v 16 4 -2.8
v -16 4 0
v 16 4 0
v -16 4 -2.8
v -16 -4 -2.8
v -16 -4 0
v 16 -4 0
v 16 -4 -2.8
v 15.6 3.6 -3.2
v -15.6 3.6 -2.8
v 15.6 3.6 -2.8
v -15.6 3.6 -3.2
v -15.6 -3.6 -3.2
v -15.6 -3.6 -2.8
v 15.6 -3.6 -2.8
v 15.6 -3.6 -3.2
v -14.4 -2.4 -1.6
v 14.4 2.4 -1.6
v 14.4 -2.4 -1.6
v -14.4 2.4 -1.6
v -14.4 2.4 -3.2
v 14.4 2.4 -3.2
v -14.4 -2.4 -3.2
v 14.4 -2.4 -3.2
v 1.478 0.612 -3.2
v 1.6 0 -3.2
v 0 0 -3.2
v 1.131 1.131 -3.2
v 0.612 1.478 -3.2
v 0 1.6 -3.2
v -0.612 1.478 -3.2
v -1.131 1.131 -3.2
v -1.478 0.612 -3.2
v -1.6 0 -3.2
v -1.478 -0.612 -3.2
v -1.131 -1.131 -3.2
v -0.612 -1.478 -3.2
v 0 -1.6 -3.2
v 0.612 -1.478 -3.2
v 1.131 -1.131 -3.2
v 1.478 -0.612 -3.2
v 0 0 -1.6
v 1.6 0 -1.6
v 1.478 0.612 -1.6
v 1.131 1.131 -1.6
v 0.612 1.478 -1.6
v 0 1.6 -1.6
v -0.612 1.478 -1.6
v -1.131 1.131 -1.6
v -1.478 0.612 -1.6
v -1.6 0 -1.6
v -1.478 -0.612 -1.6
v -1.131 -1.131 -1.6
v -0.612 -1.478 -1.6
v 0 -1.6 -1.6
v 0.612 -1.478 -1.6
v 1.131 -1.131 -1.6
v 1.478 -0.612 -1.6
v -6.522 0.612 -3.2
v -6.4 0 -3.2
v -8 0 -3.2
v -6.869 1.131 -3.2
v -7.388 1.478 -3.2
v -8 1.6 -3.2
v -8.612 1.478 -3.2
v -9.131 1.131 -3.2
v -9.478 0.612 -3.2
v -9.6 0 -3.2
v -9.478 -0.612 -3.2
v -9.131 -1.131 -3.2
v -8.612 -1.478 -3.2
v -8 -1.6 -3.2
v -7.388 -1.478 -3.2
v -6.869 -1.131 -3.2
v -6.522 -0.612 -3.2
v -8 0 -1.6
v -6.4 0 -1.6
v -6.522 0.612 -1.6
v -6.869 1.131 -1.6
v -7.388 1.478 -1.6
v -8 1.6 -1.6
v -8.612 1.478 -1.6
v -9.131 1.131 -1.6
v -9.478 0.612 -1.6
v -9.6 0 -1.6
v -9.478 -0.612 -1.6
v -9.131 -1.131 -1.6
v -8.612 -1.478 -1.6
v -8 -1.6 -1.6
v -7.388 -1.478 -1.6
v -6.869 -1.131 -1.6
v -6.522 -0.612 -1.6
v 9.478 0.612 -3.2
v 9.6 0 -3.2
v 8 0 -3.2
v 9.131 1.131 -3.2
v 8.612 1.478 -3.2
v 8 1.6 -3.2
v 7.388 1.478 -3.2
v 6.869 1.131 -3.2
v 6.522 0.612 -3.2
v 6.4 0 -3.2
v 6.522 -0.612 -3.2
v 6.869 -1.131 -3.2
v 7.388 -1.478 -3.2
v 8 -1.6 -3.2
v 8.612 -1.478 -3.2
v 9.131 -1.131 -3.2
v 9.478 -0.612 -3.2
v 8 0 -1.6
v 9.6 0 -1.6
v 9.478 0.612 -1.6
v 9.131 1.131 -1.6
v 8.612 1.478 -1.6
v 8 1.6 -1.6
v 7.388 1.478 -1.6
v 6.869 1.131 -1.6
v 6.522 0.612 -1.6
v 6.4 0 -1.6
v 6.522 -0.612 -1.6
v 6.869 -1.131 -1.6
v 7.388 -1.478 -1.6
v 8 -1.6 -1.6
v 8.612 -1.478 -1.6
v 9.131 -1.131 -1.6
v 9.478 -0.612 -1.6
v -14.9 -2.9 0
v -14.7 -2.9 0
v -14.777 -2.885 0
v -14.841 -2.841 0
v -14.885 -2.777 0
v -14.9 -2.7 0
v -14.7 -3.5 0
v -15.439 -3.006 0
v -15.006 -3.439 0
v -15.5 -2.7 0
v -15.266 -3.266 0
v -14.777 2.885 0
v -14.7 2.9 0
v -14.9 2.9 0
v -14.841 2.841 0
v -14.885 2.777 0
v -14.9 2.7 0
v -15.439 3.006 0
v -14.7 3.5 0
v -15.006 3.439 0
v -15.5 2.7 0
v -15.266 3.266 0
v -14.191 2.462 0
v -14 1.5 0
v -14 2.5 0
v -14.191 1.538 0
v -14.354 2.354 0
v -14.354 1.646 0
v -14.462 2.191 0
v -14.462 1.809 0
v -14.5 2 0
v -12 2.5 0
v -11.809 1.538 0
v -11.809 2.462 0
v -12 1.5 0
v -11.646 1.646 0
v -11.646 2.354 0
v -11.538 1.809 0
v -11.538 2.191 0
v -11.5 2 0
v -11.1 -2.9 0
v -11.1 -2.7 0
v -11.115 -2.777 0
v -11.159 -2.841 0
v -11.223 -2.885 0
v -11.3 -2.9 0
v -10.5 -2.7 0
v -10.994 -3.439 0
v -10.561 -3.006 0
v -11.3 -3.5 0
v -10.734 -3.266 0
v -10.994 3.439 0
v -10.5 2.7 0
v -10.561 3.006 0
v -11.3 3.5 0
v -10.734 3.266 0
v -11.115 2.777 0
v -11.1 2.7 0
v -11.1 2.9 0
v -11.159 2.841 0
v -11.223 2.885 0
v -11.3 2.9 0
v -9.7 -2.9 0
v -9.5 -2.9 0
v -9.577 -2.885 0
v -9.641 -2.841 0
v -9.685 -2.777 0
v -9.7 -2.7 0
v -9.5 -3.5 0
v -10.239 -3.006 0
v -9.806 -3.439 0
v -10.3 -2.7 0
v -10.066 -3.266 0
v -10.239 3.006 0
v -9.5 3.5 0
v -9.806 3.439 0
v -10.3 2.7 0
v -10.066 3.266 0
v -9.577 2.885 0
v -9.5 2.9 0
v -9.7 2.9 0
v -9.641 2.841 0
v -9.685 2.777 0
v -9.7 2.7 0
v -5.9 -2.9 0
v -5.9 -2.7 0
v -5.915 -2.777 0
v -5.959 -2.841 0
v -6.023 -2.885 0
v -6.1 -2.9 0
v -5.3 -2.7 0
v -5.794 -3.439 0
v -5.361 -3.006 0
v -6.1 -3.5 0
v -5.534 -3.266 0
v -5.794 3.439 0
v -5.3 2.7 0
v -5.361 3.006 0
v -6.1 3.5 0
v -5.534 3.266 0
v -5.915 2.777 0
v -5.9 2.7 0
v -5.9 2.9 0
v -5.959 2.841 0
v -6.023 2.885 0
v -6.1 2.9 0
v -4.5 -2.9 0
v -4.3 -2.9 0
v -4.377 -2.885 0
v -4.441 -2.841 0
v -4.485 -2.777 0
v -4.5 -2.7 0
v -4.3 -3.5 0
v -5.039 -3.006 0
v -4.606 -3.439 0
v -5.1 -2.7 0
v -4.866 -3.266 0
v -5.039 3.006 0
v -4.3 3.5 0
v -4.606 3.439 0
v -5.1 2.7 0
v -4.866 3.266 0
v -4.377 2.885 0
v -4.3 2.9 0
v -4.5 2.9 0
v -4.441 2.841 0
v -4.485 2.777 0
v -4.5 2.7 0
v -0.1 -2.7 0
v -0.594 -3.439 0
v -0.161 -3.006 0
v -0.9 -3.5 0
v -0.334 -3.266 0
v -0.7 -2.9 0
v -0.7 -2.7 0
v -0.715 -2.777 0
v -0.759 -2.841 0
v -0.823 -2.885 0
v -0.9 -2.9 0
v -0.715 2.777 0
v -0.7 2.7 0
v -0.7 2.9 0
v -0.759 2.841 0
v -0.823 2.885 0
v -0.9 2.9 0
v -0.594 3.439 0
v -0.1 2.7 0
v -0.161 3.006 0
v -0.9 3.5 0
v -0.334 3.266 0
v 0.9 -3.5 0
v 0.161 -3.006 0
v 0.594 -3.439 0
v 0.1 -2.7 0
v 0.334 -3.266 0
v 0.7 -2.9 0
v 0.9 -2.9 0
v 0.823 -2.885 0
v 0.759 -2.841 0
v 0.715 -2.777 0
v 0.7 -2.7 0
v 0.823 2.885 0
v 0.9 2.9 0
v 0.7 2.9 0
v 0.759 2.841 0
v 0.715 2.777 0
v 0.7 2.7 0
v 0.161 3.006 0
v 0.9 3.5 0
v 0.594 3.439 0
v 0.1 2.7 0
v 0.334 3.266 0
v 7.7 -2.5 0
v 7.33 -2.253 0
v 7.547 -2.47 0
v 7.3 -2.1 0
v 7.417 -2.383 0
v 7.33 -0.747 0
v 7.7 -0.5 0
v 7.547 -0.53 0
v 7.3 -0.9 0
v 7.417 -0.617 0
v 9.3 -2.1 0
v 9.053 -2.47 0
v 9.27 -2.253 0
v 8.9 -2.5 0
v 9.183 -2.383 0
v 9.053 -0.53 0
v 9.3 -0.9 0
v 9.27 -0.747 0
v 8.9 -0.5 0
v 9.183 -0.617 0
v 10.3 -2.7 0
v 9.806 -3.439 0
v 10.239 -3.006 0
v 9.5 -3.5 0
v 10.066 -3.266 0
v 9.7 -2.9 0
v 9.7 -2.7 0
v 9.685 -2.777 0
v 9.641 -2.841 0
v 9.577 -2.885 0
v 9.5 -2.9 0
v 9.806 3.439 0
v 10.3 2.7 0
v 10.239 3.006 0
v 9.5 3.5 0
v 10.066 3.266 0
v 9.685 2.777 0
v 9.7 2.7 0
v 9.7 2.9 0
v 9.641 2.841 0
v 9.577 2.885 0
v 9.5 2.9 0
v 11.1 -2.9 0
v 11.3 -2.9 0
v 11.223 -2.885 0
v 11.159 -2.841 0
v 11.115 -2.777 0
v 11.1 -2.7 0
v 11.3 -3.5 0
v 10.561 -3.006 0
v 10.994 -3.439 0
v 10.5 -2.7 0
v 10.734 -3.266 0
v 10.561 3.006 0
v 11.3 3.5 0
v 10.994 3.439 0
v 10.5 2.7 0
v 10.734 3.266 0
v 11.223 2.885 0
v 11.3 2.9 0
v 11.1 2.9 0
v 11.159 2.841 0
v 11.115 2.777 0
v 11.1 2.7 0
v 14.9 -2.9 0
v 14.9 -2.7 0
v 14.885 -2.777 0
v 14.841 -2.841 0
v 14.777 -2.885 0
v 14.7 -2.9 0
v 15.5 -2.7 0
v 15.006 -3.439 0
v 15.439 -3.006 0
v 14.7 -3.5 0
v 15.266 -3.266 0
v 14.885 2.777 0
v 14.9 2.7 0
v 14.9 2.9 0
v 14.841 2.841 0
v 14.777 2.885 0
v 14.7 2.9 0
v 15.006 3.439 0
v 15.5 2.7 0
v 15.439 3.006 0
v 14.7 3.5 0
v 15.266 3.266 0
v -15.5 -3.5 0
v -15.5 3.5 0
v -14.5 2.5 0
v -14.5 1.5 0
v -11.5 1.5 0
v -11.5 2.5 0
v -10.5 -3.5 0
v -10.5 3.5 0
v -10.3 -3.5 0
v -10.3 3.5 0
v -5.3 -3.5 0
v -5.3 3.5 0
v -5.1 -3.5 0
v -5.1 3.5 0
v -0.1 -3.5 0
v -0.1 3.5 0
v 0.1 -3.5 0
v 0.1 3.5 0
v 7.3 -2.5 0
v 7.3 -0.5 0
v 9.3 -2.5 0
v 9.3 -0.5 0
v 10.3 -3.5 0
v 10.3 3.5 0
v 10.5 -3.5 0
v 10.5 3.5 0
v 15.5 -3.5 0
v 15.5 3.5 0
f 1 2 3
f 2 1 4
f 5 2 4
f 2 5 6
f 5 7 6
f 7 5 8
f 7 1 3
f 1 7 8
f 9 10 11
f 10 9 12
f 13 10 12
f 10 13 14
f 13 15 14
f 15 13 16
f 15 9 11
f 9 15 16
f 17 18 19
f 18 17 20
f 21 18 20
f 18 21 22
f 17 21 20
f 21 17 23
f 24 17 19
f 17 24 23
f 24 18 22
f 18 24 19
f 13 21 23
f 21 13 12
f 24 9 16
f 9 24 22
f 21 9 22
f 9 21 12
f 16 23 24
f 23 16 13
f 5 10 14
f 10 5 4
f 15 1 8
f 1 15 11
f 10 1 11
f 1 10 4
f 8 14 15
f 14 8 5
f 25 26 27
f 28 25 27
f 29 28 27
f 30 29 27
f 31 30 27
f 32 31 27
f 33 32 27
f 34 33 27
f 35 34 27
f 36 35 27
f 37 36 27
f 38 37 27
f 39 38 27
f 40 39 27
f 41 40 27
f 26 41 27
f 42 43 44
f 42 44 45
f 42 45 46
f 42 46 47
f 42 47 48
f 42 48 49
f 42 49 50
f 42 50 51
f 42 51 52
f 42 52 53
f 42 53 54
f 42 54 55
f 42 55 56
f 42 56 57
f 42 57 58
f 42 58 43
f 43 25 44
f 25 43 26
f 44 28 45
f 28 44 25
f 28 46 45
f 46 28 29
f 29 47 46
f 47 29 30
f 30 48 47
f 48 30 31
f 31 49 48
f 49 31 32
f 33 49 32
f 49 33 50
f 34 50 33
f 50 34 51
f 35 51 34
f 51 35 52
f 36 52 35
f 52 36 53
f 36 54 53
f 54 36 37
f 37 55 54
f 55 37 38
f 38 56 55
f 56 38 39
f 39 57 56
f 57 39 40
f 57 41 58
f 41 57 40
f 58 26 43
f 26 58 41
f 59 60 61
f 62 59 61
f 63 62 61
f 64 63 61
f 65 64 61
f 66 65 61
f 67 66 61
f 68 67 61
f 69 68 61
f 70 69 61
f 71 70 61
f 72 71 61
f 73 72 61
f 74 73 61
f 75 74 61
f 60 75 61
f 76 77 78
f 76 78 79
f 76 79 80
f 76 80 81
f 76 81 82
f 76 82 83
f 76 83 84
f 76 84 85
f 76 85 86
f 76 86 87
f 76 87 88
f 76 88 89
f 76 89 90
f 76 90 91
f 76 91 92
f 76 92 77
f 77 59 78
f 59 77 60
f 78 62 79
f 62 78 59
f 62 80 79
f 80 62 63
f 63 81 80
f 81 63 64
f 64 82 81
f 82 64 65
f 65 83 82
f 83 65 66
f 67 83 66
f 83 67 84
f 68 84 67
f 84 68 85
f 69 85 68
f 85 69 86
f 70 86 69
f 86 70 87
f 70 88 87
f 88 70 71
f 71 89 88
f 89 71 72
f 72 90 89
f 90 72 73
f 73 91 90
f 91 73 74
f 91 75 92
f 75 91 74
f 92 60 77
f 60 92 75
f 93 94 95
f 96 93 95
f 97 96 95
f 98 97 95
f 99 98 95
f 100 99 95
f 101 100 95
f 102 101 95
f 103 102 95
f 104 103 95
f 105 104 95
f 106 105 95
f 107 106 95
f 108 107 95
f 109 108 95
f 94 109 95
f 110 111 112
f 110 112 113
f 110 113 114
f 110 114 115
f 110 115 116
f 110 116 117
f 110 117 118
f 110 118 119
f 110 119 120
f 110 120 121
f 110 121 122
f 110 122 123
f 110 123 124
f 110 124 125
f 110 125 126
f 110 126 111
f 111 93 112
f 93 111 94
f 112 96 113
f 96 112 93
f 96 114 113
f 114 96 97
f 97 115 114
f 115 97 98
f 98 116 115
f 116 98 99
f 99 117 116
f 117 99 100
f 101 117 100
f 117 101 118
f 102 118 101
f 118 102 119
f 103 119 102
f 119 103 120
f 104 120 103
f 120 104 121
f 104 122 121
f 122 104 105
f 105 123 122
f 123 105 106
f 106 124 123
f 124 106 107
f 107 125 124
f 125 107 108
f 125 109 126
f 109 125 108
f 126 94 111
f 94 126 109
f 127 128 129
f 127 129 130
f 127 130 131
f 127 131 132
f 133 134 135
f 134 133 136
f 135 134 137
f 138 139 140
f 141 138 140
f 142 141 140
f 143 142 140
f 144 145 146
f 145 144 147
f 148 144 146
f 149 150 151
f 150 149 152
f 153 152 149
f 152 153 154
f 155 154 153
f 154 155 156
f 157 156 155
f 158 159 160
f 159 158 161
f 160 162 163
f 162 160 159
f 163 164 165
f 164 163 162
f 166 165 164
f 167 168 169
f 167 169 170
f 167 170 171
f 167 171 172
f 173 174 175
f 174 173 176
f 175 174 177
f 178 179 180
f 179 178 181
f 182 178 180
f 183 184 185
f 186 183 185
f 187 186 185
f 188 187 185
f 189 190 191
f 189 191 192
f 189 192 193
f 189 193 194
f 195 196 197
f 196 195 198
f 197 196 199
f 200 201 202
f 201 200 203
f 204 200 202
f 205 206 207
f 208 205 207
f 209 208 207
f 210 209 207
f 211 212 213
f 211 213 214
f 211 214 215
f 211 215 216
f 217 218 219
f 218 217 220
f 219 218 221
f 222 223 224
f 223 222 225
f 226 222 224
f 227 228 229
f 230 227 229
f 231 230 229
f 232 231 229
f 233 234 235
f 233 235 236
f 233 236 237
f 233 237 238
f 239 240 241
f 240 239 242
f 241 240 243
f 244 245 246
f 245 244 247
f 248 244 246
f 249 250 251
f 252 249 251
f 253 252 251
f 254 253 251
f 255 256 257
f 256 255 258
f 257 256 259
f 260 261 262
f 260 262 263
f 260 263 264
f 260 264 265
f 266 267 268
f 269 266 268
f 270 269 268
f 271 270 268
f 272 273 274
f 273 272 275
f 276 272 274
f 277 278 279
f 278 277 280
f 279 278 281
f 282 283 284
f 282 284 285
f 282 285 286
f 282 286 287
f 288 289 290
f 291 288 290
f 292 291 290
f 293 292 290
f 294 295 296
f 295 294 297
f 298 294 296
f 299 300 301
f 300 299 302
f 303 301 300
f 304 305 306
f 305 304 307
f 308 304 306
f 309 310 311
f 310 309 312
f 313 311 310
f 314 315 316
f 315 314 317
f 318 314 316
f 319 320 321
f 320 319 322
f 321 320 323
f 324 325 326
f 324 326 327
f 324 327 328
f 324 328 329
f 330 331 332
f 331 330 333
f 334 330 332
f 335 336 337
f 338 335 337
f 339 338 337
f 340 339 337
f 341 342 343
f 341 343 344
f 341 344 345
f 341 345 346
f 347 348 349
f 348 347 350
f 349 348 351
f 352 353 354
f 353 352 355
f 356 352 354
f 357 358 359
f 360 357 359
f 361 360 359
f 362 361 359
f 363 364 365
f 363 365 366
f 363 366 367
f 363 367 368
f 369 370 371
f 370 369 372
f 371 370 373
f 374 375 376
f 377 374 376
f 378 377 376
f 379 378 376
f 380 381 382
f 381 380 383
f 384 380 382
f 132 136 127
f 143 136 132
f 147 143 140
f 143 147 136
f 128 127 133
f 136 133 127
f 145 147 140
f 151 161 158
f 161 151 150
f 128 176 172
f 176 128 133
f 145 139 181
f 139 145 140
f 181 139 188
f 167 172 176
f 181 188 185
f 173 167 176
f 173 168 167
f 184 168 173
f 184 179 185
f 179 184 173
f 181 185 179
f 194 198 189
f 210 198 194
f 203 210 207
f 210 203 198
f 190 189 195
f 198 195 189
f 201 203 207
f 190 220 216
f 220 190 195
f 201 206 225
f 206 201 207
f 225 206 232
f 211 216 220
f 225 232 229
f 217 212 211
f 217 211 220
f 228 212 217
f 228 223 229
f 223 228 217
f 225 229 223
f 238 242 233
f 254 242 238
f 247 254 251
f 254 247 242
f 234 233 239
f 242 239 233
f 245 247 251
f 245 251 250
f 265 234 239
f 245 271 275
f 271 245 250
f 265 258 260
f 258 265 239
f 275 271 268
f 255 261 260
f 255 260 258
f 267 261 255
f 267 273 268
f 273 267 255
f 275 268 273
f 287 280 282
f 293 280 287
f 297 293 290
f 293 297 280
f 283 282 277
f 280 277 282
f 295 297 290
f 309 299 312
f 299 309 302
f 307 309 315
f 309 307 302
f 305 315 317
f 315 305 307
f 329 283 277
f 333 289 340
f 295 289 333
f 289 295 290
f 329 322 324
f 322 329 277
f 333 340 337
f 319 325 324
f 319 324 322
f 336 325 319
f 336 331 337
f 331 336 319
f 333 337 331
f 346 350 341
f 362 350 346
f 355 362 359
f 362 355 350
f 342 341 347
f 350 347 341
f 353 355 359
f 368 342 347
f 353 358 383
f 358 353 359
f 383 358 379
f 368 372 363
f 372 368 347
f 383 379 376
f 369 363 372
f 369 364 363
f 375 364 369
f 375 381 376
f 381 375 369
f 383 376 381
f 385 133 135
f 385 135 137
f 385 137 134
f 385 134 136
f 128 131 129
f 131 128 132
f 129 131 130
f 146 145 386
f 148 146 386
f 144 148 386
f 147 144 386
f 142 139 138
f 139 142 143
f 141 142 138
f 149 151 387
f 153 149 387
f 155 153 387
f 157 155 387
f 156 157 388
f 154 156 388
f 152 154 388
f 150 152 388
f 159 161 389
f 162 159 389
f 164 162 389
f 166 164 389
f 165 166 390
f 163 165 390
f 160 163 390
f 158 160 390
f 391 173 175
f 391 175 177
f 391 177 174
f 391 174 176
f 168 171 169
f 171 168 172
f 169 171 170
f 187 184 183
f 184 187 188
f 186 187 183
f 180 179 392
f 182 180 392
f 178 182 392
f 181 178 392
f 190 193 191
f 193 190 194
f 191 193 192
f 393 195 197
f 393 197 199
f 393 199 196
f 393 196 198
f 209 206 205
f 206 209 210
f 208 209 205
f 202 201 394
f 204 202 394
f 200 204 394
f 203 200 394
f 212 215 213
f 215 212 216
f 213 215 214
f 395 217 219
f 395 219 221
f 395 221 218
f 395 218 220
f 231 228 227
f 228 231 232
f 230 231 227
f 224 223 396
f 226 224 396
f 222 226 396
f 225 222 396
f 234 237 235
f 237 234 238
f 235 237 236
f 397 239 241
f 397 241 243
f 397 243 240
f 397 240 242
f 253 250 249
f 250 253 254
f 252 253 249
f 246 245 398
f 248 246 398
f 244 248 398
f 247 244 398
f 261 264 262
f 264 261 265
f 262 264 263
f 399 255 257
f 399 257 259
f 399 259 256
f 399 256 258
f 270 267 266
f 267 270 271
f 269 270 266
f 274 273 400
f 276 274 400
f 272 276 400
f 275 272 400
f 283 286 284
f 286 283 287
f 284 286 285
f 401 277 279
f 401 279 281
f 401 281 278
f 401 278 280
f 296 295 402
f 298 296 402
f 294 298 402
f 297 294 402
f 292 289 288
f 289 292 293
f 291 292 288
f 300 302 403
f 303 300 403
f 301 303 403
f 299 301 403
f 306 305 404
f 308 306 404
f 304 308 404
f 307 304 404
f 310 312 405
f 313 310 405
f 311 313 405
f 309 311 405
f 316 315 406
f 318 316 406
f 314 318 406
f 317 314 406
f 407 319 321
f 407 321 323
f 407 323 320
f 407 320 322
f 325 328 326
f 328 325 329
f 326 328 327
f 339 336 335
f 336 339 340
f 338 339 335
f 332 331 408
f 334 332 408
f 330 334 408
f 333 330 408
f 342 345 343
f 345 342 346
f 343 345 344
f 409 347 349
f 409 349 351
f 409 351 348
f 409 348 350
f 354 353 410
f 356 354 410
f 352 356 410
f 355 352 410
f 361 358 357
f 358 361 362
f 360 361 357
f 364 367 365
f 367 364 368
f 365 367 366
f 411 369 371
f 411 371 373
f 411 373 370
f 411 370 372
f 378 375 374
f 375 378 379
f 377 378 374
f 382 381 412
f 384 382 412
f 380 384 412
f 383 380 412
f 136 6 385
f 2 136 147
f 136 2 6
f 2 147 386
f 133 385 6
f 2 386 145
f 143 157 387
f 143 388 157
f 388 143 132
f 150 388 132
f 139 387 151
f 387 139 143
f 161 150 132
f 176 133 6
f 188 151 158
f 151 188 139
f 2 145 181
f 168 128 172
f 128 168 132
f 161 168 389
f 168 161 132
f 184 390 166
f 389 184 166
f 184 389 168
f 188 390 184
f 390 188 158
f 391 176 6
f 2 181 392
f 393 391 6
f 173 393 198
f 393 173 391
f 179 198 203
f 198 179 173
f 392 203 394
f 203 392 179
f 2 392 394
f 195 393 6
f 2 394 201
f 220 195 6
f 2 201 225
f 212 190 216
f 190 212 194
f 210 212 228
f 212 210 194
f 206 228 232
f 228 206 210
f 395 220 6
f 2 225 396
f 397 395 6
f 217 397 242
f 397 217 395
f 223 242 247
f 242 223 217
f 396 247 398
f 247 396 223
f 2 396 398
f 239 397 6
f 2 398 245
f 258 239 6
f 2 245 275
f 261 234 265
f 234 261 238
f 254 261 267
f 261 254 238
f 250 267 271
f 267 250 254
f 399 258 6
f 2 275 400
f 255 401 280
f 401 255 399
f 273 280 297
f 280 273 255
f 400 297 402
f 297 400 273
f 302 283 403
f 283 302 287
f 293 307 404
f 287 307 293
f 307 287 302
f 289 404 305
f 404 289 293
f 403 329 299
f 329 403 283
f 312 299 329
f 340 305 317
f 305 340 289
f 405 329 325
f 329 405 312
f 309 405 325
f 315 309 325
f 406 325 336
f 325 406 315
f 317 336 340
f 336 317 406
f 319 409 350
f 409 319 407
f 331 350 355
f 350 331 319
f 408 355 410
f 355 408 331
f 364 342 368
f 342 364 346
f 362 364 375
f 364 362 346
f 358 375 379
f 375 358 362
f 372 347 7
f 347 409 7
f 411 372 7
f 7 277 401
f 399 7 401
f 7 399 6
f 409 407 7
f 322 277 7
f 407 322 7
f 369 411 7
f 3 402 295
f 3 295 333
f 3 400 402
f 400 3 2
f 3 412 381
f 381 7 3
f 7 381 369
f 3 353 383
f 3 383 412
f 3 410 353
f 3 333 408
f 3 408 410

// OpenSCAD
use <../lib.scad>
use <s/2431pzbs01.scad>
use <s/2431pzbs02.scad>
use <s/2431s01.scad>
function ldraw_lib__2431pzb() = [
// 0 Tile  1 x  4 with Black Stormtrooper Utility Belt Pattern
// 0 Name: 2431pzb.dat
// 0 Author: Damien Roux [Darats]
// 0 !LDRAW_ORG Part UPDATE 2019-02
// 0 !LICENSE Licensed under CC BY 4.0 : see CAreadme.txt
// 
// 0 BFC CERTIFY CCW
  [0,"BFC","CERTIFY"],
  [0,"BFC","CCW"],
// 
// 0 !KEYWORDS Brickheadz, Bricklink 2431pb489, Finn, Rebrickable 2431pr0103
// 0 !KEYWORDS Set 41485
// 
// 0 !HISTORY 2019-09-09 [PTadmin] Official Update 2019-02
// 
// 
// 1 16 0 0 0 1 0 0 0 1 0 0 0 1 s\2431s01.dat
  [1,16,0,0,0,1,0,0,0,1,0,0,0,1, ldraw_lib__s__2431s01()],
// 1 0 0 0 0 1 0 0 0 1 0 0 0 1 s\2431pzbs01.dat
  [1,0,0,0,0,1,0,0,0,1,0,0,0,1, ldraw_lib__s__2431pzbs01()],
// 1 16 0 0 0 1 0 0 0 1 0 0 0 1 s\2431pzbs02.dat
  [1,16,0,0,0,1,0,0,0,1,0,0,0,1, ldraw_lib__s__2431pzbs02()],
];
module ldraw_lib__2431pzb(step=0, col=false, unit=2/5, alt=false, line=0.2, solid=!$preview)
    makepoly(ldraw_lib__2431pzb(), step=step, col=col, unit=unit, alt=alt, line=line, solid=solid);
ldraw_lib__2431pzb(line=0.2);
